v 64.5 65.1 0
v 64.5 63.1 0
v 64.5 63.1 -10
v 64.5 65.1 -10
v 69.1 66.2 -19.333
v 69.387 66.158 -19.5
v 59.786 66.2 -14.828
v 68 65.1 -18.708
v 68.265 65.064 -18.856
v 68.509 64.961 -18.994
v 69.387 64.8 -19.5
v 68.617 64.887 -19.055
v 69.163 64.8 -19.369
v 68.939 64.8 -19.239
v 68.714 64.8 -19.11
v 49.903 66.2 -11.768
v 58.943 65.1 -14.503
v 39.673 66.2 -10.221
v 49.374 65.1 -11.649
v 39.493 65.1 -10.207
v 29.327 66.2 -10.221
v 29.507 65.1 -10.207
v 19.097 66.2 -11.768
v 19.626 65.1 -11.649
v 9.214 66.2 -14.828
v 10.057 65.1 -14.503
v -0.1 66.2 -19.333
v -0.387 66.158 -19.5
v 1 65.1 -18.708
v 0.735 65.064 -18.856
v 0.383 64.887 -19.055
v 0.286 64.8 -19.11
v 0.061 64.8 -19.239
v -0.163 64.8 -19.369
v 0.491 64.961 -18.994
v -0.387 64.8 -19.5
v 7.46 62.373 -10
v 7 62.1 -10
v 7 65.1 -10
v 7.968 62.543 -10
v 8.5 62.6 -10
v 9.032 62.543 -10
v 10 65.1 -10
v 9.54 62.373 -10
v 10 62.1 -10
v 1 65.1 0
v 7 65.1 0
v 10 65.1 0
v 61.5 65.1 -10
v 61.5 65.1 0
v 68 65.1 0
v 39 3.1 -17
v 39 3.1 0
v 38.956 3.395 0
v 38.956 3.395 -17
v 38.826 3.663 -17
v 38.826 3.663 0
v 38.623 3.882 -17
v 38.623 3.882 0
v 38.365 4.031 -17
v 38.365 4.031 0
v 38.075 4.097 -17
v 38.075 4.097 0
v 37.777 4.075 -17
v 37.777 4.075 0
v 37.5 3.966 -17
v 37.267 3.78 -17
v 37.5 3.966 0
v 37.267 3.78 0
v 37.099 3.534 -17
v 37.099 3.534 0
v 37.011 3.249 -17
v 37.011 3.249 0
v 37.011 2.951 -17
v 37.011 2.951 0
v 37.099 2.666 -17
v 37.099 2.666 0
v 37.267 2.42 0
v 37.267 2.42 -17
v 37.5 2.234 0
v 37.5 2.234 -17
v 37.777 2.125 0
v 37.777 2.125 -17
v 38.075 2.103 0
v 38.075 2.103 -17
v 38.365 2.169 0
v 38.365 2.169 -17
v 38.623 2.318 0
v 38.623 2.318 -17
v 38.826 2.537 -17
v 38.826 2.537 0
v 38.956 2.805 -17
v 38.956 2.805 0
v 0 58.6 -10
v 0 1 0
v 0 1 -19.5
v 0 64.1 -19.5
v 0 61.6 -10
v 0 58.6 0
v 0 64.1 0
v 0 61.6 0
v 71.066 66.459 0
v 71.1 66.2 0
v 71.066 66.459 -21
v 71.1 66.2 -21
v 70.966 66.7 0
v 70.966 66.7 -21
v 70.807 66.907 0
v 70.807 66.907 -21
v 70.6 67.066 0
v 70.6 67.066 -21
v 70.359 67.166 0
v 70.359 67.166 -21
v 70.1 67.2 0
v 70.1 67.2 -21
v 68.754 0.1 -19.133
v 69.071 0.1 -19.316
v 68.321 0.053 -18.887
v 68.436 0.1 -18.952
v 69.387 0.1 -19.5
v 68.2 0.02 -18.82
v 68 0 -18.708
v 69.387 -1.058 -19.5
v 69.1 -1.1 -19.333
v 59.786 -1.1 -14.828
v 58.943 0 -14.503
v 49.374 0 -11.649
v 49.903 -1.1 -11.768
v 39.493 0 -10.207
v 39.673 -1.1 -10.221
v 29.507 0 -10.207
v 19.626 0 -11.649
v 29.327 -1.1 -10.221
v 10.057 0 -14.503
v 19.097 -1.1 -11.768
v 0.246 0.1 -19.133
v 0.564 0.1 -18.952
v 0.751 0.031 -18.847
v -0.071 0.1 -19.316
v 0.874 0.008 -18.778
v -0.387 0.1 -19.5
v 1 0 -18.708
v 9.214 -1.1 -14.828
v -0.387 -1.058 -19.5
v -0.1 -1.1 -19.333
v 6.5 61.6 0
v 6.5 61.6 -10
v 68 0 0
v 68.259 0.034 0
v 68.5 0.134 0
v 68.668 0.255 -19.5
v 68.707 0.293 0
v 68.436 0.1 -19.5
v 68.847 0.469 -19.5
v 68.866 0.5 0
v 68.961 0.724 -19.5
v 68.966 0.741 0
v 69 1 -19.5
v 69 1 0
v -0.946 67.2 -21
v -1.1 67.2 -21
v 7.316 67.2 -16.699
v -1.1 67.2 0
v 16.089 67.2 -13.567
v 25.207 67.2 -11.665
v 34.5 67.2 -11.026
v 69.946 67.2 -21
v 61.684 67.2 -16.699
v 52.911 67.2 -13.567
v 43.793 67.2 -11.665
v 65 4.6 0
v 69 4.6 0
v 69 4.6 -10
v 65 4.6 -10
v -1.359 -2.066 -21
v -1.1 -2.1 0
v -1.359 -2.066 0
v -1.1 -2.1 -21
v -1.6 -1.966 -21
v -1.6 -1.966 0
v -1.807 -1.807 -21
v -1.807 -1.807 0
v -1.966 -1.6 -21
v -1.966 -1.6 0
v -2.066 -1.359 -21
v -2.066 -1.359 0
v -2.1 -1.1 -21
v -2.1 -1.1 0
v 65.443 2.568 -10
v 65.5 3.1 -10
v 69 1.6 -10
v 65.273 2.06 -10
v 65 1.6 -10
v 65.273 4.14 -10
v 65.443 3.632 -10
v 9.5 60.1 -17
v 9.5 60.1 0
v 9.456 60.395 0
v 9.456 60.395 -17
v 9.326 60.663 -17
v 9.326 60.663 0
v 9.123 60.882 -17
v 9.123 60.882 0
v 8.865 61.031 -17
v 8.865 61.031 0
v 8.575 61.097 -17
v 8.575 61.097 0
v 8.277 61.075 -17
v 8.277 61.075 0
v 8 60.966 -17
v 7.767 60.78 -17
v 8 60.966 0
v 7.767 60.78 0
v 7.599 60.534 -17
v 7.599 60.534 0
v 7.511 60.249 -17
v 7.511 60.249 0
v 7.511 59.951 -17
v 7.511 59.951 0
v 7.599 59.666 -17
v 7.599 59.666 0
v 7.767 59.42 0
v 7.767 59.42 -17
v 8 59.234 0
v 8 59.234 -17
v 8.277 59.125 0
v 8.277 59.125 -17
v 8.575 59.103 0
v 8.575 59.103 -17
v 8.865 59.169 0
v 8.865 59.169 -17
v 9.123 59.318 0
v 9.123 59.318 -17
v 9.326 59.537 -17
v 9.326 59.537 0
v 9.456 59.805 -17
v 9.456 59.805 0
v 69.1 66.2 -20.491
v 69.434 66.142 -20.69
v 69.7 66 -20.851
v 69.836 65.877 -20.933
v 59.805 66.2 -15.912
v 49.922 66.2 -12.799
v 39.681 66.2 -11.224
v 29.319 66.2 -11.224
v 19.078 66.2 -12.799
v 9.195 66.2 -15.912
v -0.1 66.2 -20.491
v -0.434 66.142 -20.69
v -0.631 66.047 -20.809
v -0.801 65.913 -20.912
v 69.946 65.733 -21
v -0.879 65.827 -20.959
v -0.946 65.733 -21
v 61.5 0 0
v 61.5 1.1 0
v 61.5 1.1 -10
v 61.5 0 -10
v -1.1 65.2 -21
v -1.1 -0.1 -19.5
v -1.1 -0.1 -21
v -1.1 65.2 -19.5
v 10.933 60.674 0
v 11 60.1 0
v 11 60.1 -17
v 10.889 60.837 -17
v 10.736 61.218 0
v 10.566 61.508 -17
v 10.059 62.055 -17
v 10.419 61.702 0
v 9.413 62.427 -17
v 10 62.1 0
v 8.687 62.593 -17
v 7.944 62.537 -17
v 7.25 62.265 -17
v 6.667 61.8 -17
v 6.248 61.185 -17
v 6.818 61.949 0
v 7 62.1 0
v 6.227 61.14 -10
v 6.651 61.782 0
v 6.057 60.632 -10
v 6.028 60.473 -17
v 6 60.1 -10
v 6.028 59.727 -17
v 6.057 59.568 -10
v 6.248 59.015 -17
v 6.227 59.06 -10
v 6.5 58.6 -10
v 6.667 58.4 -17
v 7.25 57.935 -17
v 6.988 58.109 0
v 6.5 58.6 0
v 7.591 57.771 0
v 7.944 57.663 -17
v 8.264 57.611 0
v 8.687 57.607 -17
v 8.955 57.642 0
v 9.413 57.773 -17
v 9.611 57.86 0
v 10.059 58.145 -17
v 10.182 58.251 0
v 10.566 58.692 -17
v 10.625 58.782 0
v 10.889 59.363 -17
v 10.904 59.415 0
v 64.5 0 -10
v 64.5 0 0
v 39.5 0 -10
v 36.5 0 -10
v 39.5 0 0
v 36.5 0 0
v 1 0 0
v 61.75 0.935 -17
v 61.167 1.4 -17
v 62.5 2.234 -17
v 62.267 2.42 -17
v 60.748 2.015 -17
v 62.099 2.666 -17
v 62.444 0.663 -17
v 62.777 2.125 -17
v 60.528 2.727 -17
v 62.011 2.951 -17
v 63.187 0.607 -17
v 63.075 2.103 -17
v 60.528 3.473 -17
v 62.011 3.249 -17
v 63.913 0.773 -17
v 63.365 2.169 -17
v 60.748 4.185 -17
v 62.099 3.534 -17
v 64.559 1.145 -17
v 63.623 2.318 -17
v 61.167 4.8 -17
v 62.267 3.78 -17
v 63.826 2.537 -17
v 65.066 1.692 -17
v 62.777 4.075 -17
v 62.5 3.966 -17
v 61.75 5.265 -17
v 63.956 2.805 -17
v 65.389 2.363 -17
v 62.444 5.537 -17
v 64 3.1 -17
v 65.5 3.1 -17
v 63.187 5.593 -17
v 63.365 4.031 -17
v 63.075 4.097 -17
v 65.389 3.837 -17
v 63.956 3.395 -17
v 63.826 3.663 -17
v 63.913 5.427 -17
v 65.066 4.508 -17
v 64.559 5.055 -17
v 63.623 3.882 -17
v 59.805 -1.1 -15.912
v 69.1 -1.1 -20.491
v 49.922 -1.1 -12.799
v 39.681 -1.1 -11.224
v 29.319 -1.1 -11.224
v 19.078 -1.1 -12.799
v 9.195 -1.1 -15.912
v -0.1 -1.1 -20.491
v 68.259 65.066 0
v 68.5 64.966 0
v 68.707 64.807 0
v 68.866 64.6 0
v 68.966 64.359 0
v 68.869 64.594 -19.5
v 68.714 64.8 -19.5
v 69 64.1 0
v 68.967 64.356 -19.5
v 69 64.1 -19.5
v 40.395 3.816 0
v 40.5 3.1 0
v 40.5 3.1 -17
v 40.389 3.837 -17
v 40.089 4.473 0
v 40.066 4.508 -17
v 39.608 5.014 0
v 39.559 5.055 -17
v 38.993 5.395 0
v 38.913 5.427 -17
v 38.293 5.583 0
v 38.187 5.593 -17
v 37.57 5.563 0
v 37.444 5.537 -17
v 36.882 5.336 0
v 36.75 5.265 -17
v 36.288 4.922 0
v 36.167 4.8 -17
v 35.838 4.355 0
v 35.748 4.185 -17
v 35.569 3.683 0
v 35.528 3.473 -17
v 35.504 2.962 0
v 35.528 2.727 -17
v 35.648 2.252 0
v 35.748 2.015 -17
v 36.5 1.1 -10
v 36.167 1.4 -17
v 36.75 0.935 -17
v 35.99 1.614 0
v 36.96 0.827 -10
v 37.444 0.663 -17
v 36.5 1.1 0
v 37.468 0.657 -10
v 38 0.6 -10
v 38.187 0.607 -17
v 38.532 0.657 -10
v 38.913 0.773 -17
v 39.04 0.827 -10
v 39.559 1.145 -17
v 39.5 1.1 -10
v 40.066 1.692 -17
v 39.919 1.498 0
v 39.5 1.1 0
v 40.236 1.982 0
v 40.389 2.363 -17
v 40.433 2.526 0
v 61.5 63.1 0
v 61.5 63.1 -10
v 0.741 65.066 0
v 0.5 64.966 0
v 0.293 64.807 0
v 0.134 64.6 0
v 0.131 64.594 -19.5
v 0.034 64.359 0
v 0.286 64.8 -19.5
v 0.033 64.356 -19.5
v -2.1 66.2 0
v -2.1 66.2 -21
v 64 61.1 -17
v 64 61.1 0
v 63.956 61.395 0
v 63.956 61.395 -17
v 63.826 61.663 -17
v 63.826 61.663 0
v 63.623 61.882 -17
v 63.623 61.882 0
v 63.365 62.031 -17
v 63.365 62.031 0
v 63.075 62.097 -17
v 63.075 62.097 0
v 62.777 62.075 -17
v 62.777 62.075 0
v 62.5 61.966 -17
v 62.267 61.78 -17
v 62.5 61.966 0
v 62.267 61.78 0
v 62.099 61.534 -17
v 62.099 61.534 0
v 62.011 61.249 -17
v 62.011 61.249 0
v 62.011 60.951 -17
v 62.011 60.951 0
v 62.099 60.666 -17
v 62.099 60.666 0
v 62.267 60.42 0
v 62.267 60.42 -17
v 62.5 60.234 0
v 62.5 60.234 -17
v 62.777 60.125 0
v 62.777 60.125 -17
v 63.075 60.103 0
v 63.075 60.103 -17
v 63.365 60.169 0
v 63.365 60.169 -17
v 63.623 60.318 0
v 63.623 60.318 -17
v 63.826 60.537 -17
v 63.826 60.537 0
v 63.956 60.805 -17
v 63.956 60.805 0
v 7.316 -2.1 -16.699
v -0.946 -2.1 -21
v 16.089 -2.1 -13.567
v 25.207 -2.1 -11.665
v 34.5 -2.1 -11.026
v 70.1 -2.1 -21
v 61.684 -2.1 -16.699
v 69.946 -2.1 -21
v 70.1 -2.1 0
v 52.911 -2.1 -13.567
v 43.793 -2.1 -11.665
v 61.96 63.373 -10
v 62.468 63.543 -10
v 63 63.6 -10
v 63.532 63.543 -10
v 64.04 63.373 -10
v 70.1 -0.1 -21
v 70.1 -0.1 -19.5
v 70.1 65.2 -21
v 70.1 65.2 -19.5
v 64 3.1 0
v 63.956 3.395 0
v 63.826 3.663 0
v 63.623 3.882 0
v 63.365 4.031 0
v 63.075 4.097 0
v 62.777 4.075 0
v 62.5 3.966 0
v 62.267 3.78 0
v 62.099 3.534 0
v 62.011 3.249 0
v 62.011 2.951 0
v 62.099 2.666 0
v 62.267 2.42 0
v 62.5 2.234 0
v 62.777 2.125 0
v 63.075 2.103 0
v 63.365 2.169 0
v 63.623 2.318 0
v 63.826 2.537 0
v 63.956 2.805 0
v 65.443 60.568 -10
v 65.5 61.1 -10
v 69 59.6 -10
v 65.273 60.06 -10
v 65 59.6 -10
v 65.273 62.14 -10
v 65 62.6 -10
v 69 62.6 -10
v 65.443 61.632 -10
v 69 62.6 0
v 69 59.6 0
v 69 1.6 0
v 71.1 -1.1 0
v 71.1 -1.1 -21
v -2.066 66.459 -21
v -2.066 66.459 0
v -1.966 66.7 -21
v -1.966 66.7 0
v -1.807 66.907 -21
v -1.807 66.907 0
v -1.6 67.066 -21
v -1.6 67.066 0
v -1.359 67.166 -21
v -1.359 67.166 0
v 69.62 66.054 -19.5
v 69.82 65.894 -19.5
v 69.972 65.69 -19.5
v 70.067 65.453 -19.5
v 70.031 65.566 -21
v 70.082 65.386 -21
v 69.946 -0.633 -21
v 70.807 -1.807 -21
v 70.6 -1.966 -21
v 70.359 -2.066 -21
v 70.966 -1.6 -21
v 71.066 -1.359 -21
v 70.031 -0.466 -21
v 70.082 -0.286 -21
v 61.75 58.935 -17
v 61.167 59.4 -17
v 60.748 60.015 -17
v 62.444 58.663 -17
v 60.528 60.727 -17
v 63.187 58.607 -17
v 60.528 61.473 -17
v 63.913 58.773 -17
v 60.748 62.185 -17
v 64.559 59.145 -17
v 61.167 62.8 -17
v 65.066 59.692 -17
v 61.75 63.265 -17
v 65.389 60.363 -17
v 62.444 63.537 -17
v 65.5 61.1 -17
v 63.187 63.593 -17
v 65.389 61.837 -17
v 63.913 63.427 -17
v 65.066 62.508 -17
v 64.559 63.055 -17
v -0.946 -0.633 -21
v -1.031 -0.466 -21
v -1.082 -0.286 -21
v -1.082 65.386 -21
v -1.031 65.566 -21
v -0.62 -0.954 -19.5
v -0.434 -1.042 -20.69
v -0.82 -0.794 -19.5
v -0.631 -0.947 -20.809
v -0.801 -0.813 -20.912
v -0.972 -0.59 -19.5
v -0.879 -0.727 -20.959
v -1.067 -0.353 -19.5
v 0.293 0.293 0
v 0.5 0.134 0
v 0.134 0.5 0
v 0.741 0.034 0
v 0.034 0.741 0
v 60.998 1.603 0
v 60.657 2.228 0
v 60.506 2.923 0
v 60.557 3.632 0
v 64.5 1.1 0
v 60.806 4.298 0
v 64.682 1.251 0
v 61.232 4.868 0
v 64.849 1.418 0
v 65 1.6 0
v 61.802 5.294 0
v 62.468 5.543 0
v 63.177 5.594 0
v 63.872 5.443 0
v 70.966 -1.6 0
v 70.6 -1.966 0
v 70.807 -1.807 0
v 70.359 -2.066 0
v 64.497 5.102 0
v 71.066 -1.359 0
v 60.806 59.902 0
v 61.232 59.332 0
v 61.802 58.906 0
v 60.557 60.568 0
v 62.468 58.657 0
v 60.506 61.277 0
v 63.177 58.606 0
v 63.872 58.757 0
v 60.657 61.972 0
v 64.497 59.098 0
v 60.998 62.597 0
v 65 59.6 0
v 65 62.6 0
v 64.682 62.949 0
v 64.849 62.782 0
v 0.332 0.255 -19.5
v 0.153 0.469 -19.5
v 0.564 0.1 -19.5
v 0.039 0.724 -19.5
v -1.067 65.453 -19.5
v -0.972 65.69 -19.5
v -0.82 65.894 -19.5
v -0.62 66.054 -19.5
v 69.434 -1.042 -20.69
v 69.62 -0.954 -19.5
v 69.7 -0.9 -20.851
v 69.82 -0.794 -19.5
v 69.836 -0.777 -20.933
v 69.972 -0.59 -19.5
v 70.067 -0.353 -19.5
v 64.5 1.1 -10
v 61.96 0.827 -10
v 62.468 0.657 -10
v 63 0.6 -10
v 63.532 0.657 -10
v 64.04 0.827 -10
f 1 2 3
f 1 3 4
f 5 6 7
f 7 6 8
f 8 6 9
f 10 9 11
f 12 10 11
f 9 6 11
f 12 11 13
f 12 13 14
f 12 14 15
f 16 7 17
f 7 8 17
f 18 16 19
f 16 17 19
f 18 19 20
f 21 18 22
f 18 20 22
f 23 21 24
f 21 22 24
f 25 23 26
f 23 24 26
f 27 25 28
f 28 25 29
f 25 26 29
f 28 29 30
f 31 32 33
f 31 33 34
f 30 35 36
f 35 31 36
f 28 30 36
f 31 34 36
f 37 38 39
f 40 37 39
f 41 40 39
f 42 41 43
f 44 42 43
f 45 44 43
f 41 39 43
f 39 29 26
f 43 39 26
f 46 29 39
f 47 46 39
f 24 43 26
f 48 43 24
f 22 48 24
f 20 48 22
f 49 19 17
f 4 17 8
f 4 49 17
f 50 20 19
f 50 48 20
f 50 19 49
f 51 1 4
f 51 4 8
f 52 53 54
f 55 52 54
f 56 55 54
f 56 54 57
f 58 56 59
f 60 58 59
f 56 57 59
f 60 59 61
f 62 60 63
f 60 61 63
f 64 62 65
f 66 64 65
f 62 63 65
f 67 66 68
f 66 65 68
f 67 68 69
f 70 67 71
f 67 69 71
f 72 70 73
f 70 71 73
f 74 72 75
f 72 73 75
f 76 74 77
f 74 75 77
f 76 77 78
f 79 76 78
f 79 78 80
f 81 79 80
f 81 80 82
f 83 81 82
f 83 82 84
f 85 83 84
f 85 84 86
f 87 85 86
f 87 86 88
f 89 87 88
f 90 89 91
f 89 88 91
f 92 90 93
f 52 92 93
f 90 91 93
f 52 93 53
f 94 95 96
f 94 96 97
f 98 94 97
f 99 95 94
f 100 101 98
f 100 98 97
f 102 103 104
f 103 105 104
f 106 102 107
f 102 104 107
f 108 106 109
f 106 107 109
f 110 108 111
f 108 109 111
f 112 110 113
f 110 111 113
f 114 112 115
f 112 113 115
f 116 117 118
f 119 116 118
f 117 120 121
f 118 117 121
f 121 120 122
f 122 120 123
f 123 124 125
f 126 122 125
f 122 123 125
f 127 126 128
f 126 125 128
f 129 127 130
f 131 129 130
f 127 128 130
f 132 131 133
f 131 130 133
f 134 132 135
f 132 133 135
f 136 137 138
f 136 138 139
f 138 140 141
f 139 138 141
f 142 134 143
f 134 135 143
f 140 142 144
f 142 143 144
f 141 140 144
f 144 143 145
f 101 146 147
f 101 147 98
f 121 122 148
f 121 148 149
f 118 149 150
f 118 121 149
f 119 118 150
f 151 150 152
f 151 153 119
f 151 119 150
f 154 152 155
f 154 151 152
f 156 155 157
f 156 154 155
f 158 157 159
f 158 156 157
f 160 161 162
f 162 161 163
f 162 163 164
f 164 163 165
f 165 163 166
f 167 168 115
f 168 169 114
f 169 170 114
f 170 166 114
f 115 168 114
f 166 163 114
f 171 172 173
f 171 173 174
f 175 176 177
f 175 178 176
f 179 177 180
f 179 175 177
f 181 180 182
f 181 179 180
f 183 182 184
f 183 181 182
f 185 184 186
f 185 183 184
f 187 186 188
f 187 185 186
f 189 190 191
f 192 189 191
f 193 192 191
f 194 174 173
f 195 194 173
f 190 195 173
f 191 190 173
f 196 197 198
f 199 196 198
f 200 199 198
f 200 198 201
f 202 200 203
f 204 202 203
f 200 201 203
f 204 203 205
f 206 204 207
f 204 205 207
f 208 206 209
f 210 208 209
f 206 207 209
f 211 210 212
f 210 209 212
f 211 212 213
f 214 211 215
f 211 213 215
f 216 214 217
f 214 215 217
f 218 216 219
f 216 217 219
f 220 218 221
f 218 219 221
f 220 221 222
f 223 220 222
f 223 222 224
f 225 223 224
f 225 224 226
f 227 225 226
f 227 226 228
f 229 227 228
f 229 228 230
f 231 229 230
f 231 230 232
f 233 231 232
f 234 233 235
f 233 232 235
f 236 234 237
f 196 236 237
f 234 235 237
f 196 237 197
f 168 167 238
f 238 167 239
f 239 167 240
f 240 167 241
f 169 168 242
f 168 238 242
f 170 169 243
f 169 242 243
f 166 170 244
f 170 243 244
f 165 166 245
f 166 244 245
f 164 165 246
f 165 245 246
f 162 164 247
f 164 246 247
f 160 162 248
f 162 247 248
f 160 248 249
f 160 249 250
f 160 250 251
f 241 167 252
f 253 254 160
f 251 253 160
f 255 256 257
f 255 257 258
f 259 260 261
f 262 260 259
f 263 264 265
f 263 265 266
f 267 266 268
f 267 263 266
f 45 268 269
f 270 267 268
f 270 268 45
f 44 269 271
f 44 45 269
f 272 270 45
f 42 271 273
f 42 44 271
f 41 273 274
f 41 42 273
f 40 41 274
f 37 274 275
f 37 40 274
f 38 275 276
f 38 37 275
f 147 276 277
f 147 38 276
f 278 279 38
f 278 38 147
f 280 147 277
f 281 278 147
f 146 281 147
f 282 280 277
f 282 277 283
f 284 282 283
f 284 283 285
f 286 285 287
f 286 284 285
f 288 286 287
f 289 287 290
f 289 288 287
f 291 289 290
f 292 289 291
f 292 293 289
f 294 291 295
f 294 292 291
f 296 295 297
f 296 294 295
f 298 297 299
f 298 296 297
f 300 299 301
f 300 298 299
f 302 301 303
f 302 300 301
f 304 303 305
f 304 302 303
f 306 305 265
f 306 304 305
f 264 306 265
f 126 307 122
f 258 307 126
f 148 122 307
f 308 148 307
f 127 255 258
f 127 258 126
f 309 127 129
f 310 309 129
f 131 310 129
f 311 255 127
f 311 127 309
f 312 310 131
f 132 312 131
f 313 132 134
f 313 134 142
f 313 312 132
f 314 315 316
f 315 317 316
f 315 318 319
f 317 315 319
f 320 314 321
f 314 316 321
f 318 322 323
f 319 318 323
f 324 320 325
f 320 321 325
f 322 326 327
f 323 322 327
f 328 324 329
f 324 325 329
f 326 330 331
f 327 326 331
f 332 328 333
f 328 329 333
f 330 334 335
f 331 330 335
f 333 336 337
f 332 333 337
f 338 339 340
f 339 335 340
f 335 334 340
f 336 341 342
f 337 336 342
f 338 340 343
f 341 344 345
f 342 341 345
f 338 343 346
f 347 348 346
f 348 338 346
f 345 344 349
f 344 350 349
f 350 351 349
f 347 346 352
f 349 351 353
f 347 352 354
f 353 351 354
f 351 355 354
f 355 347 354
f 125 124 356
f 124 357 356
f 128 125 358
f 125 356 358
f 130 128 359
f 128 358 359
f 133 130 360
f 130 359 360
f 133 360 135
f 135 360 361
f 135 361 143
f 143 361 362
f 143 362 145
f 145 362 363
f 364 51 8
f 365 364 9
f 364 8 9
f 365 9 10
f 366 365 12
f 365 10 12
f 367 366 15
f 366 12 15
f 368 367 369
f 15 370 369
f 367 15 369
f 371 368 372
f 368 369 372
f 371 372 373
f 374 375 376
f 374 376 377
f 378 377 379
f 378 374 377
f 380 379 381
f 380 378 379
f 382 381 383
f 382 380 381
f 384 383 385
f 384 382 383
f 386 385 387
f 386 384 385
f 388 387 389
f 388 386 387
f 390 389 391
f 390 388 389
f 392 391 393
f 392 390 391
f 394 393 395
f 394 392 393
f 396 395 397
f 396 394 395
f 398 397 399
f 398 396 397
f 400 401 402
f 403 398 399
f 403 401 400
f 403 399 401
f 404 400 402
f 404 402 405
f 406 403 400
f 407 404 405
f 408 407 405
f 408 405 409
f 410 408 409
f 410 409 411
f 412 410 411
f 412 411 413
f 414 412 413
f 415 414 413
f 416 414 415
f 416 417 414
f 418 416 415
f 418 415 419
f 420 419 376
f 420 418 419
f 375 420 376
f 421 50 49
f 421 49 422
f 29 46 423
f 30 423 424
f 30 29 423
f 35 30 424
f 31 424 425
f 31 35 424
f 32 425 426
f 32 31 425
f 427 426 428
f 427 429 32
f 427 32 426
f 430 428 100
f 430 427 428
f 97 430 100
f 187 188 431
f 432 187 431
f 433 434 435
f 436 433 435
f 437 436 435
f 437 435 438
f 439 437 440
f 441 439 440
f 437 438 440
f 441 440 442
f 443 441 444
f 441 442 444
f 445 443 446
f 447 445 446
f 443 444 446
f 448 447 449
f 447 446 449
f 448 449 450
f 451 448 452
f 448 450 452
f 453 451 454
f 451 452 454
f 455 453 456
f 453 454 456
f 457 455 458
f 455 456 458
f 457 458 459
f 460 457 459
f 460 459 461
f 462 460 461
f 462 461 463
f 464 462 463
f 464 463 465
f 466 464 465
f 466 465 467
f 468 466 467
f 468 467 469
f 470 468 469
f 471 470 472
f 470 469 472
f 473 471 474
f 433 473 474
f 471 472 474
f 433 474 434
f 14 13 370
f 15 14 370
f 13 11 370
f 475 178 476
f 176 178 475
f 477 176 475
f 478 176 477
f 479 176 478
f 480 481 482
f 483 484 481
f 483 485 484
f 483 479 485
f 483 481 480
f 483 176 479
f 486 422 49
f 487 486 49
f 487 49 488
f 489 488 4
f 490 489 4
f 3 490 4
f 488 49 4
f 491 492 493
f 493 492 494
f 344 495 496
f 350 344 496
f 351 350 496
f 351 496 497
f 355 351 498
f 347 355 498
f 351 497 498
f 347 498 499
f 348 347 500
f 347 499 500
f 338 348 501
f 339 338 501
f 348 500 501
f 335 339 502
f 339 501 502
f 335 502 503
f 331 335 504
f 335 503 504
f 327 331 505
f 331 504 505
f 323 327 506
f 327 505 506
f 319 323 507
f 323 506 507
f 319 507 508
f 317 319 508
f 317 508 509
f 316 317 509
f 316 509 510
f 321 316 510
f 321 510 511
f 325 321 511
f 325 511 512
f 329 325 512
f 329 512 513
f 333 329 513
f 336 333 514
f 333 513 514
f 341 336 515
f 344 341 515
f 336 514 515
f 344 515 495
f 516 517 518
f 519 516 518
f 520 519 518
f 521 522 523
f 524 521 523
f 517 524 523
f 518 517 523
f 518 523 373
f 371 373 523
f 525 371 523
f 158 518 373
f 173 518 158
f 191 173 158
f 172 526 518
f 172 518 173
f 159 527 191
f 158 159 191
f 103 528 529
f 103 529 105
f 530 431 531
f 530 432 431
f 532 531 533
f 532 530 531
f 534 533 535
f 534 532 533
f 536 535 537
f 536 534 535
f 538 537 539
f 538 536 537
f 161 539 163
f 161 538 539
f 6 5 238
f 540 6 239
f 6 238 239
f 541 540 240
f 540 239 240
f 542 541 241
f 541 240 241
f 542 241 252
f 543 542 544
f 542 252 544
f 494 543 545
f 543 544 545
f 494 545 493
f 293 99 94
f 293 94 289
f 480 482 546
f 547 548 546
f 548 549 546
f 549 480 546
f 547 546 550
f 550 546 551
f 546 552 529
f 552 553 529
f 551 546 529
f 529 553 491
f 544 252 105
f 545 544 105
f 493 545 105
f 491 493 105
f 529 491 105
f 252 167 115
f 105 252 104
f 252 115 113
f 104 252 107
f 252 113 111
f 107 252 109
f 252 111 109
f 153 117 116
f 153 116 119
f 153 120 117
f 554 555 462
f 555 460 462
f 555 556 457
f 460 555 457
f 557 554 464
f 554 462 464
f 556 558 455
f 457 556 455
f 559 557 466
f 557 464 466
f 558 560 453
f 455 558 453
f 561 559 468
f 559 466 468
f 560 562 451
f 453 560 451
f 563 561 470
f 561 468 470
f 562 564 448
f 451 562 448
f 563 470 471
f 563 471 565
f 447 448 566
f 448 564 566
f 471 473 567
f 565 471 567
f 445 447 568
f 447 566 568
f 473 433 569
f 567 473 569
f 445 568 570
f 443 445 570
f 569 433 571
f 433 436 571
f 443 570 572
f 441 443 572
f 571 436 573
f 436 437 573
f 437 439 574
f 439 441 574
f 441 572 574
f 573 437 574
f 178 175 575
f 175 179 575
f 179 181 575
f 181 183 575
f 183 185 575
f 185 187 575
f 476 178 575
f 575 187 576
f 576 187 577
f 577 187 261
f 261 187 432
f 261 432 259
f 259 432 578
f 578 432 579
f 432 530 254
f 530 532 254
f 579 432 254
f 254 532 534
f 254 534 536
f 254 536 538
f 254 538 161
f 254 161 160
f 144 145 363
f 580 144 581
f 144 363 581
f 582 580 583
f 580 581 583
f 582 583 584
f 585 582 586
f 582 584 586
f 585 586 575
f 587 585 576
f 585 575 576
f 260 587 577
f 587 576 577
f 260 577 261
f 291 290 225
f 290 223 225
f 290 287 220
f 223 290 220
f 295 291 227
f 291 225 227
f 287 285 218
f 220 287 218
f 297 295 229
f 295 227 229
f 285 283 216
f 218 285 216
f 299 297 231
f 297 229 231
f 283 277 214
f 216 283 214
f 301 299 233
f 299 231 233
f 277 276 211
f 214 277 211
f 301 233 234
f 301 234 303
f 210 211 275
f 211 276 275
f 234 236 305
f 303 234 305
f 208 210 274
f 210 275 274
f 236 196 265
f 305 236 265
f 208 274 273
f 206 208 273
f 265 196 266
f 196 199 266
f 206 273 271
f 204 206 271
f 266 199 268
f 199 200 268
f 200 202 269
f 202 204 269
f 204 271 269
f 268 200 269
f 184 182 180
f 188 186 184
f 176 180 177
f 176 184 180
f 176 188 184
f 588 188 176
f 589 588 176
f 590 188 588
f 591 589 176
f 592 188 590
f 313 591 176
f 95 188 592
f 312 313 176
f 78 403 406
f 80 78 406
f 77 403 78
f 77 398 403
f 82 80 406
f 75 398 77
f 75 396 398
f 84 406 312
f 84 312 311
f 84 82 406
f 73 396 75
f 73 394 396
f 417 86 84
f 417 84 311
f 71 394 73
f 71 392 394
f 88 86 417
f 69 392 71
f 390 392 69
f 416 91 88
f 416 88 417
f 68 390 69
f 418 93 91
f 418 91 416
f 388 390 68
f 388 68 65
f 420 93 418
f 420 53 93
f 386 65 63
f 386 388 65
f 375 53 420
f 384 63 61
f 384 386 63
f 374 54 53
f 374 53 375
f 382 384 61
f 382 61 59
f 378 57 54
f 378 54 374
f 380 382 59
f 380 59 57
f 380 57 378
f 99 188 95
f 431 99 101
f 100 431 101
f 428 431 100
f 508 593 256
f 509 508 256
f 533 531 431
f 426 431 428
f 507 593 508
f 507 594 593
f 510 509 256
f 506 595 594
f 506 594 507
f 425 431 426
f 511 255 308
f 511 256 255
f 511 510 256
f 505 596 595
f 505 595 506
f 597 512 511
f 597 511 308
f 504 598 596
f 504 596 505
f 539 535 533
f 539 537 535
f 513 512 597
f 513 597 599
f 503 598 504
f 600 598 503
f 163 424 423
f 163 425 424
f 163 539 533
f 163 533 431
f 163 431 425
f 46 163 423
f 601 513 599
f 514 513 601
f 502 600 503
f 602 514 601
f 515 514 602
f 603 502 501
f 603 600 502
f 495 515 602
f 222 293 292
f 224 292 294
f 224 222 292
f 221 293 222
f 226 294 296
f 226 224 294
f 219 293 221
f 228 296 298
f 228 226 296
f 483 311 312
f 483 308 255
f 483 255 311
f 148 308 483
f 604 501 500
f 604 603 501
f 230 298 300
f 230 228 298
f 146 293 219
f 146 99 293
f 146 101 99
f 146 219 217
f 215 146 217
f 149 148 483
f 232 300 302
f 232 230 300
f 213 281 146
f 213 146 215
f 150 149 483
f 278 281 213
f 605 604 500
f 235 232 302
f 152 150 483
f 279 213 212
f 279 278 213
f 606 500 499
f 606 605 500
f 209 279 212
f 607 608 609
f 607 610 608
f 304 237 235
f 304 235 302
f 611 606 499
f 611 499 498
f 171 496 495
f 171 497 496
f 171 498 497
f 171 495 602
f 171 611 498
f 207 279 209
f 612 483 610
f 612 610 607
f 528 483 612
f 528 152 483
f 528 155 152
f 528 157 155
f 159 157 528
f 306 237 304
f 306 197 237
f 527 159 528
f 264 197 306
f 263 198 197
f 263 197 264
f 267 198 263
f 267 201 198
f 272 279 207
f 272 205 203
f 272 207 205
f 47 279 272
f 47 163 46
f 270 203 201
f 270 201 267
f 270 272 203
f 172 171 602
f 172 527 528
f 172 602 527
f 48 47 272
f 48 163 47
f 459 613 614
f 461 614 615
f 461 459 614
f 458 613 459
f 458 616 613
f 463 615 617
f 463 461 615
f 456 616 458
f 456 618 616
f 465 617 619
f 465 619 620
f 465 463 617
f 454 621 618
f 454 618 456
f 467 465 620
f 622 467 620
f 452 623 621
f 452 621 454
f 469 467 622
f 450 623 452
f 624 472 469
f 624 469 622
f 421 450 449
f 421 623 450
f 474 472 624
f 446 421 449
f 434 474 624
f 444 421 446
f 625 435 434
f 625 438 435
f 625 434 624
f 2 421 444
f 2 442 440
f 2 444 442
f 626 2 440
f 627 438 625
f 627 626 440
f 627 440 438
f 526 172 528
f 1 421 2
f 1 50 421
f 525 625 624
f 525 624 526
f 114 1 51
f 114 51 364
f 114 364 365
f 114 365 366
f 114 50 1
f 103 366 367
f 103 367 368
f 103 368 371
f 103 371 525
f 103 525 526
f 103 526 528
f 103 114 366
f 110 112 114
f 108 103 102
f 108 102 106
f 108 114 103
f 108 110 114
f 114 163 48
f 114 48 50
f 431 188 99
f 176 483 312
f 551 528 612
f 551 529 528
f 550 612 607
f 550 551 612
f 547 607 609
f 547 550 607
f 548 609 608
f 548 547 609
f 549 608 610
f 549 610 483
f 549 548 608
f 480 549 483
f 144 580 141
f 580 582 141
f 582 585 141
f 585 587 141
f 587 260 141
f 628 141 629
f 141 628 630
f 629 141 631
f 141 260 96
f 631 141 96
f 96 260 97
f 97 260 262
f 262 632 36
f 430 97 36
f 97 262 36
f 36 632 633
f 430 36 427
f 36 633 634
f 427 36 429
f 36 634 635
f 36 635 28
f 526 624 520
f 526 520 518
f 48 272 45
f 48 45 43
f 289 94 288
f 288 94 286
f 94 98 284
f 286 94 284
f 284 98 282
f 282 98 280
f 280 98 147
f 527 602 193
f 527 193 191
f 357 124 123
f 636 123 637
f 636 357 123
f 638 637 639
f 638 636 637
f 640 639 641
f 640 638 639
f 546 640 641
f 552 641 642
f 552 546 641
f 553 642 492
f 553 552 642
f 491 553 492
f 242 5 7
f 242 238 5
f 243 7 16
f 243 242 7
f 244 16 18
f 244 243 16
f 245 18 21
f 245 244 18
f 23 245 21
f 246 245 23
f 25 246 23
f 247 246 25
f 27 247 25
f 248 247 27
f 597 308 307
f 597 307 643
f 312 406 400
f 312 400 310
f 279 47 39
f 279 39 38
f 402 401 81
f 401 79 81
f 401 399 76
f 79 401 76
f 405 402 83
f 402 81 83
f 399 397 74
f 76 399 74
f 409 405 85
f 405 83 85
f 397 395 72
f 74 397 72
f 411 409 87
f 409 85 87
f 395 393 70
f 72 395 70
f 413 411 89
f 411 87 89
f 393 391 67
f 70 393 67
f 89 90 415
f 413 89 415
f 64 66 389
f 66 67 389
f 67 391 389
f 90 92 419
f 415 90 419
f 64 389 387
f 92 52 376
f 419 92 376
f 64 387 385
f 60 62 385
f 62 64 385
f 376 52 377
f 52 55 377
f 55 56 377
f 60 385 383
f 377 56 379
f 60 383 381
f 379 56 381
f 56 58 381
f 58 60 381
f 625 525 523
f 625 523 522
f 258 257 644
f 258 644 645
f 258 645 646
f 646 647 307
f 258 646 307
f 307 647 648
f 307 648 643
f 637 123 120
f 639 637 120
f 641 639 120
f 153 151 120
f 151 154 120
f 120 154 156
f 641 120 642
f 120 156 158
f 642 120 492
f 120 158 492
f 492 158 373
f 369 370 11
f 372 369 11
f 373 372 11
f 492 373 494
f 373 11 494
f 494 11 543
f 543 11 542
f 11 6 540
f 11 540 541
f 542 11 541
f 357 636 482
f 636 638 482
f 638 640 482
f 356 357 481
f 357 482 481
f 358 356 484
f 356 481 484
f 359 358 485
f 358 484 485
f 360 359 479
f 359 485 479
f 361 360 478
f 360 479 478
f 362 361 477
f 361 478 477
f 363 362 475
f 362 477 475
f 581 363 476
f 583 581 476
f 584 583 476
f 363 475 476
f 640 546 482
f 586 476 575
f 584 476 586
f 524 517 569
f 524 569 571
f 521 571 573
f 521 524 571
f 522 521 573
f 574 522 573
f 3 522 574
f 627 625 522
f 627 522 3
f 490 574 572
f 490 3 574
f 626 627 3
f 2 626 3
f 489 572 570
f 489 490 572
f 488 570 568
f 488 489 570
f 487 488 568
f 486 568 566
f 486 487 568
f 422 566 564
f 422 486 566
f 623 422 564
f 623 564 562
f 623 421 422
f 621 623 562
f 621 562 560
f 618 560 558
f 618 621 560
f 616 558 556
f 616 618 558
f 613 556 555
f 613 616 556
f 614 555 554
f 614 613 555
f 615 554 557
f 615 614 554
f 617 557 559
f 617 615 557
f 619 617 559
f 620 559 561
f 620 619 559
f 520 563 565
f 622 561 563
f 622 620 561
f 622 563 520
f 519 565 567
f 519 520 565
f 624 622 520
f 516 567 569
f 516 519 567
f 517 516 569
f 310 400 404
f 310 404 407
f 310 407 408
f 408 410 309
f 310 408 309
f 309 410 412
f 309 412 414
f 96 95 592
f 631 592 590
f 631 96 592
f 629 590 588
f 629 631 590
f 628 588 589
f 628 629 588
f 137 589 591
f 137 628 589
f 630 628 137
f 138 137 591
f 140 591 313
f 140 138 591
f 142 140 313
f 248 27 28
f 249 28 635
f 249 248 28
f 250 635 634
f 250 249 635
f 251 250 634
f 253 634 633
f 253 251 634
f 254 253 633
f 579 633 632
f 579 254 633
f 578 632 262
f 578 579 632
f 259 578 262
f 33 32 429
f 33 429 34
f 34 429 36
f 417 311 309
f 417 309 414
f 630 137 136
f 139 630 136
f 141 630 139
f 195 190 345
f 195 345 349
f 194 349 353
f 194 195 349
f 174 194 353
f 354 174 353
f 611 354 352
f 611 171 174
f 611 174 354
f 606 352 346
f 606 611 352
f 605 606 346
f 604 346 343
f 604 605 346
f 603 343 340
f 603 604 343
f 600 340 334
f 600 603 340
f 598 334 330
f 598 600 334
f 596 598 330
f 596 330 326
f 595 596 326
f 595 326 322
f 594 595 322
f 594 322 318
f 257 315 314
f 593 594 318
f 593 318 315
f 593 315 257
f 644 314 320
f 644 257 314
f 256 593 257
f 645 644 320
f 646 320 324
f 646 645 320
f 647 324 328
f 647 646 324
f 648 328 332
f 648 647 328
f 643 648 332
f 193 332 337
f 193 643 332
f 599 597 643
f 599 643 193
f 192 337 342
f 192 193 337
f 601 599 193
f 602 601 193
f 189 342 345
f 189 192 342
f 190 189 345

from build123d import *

# Parameters (mm, degrees)
SKIZZE1_R                         = 2.5
SKIZZE1_R_2                       = 1
AUFSATZ_LINEAR_AUSTRAGEN1_DEPTH   = 17
AUFSATZ_LINEAR_AUSTRAGEN1_2_DEPTH = 17
AUFSATZ_LINEAR_AUSTRAGEN1_3_DEPTH = 17
AUFSATZ_LINEAR_AUSTRAGEN1_4_DEPTH = 17
SKIZZE1_3_W                       = 73.2
SKIZZE1_3_H                       = 69.3
SKIZZE1_3_W_2                     = 71.2
SKIZZE1_3_H_2                     = 67.3
AUFSATZ_LINEAR_AUSTRAGEN2_DEPTH   = 21
SKIZZE1_4_W                       = 71.2
SKIZZE1_4_H                       = 67.3
AUFSATZ_LINEAR_AUSTRAGEN3_DEPTH   = 19.5
SCHNITT_LINEAR_AUSTRAGEN1_DEPTH   = 2.1
SCHNITT_LINEAR_START              = -1
SCHNITT_LINEAR_AUSTRAGEN4_DEPTH   = 1.2
SCHNITT_LINEAR_START_2            = -66.9
SCHNITT_LINEAR_AUSTRAGEN6_DEPTH   = 1.4
AUFSATZ_LINEAR_AUSTRAGEN4_DEPTH   = 10
SCHNITT_LINEAR_AUSTRAGEN7_DEPTH   = 10
VERRUNDUNG1_R                     = 1
VERRUNDUNG2_R                     = 1


with BuildPart() as part:
    # Skizze1 → Aufsatz-Linear austragen1 (new body)
    with BuildSketch(Plane.XY):
        with Locations((38, 3.1)):
            Circle(SKIZZE1_R)
        with Locations((38, 3.1)):
            Circle(SKIZZE1_R_2, mode=Mode.SUBTRACT)
    extrude(amount=-AUFSATZ_LINEAR_AUSTRAGEN1_DEPTH)



with BuildPart() as body_2:
    # Skizze1 → Aufsatz-Linear austragen1 2 (new body)
    with BuildSketch(Plane.XY):
        with Locations((8.5, 60.1)):
            Circle(SKIZZE1_R)
        with Locations((8.5, 60.1)):
            Circle(SKIZZE1_R_2, mode=Mode.SUBTRACT)
    extrude(amount=-AUFSATZ_LINEAR_AUSTRAGEN1_2_DEPTH)


with BuildPart() as body_3:
    # Skizze1 → Aufsatz-Linear austragen1 3 (new body)
    with BuildSketch(Plane.XY):
        with Locations((63, 3.1)):
            Circle(SKIZZE1_R)
        with Locations((63, 3.1)):
            Circle(SKIZZE1_R_2, mode=Mode.SUBTRACT)
    extrude(amount=-AUFSATZ_LINEAR_AUSTRAGEN1_3_DEPTH)


with BuildPart() as body_4:
    # Skizze1 → Aufsatz-Linear austragen1 4 (new body)
    with BuildSketch(Plane.XY):
        with Locations((63, 61.1)):
            Circle(SKIZZE1_R)
        with Locations((63, 61.1)):
            Circle(SKIZZE1_R_2, mode=Mode.SUBTRACT)
    extrude(amount=-AUFSATZ_LINEAR_AUSTRAGEN1_4_DEPTH)


with BuildPart() as body_5:
    # Skizze1<3> → Aufsatz-Linear austragen2 (new body)
    with BuildSketch(Plane.XY):
        with Locations((34.5, 32.55)):
            Rectangle(SKIZZE1_3_W, SKIZZE1_3_H)
        with Locations((34.5, 32.55)):
            Rectangle(SKIZZE1_3_W_2, SKIZZE1_3_H_2, mode=Mode.SUBTRACT)
    extrude(amount=-AUFSATZ_LINEAR_AUSTRAGEN2_DEPTH)

    # Skizze1<4> → Aufsatz-Linear austragen3 (add)
    with BuildSketch(Plane.XY):
        with Locations((34.5, 32.55)):
            Rectangle(SKIZZE1_4_W, SKIZZE1_4_H)
        Polygon((36.5, 0), (0, 0), (0, 58.6), (0, 60.1), (0, 61.6), (0, 65.1), (7, 65.1), (8.5, 65.1), (10, 65.1), (61.5, 65.1), (63, 65.1), (64.5, 65.1), (69, 65.1), (69, 62.6), (69, 61.1), (69, 59.6), (69, 4.6), (69, 3.1), (69, 1.6), (69, 0), (64.5, 0), (63, 0), (61.5, 0), (39.5, 0), (38, 0), align=None, mode=Mode.SUBTRACT)
    extrude(amount=-AUFSATZ_LINEAR_AUSTRAGEN3_DEPTH)

    # Skizze2 → Schnitt-Linear austragen1 (cut)
    with BuildSketch(Plane(origin=(0, -2.1, 0), x_dir=(-1, 0, 0), z_dir=(0, -1, 0))):
        with BuildLine():
            ThreePointArc((-69.94600721, 21), (-34.5, 11.026332841), (0.94600721, 21))
            Line((0.94600721, 21), (-69.94600721, 21))
        make_face()
    extrude(amount=-SCHNITT_LINEAR_AUSTRAGEN1_DEPTH, mode=Mode.SUBTRACT)

    # Skizze2<6> → Schnitt-Linear austragen4 (cut)
    with BuildSketch(Plane(origin=(0, -2.1, 0), x_dir=(-1, 0, 0), z_dir=(0, -1, 0)).offset(SCHNITT_LINEAR_START)):
        with BuildLine():
            Line((0.94600721, 19.831196274), (0.94600721, 21))
            ThreePointArc((0.94600721, 21), (-34.5, 11.026332841), (-69.94600721, 21))
            Line((-69.94600721, 21), (-69.94600721, 19.831196274))
            ThreePointArc((-69.94600721, 19.831196274), (-34.5, 10.026332841), (0.94600721, 19.831196274))
        make_face()
    extrude(amount=-SCHNITT_LINEAR_AUSTRAGEN4_DEPTH, mode=Mode.SUBTRACT)

    # Skizze2<14> → Schnitt-Linear austragen6 (cut)
    with BuildSketch(Plane(origin=(0, -2.1, 0), x_dir=(-1, 0, 0), z_dir=(0, -1, 0)).offset(SCHNITT_LINEAR_START_2)):
        with BuildLine():
            Line((0.94600721, 19.831196274), (0.94600721, 21))
            ThreePointArc((0.94600721, 21), (-34.5, 11.026332841), (-69.94600721, 21))
            Line((-69.94600721, 21), (-69.94600721, 19.831196274))
            ThreePointArc((-69.94600721, 19.831196274), (-34.5, 10.026332841), (0.94600721, 19.831196274))
        make_face()
    extrude(amount=-SCHNITT_LINEAR_AUSTRAGEN6_DEPTH, mode=Mode.SUBTRACT)


with BuildPart() as part_1:
    add(part.part)

    add(body_2.part)  # Aufsatz-Linear austragen4 merges body 2

    add(body_3.part)  # Aufsatz-Linear austragen4 merges body 3

    add(body_4.part)  # Aufsatz-Linear austragen4 merges body 4

    add(body_5.part)  # Aufsatz-Linear austragen4 merges body 5
    # Skizze1<5> → Aufsatz-Linear austragen4 (add)
    with BuildSketch(Plane.XY):
        with BuildLine():
            Line((36.5, 1.1), (36.5, 0))
            Line((36.5, 0), (39.5, 0))
            Line((39.5, 0), (39.5, 1.1))
            ThreePointArc((39.5, 1.1), (38, 0.6), (36.5, 1.1))
        make_face()
        with BuildLine():
            Line((0, 58.6), (6.5, 58.6))
            ThreePointArc((6.5, 58.6), (6, 60.1), (6.5, 61.6))
            Line((6.5, 61.6), (0, 61.6))
            Line((0, 61.6), (0, 58.6))
        make_face()
        with BuildLine():
            Line((61.5, 1.1), (61.5, 0))
            Line((61.5, 0), (64.5, 0))
            Line((64.5, 0), (64.5, 1.1))
            ThreePointArc((64.5, 1.1), (63, 0.6), (61.5, 1.1))
        make_face()
        with BuildLine():
            Line((10, 62.1), (10, 65.1))
            Line((10, 65.1), (7, 65.1))
            Line((7, 65.1), (7, 62.1))
            ThreePointArc((7, 62.1), (8.5, 62.6), (10, 62.1))
        make_face()
        with BuildLine():
            Line((69, 4.6), (65, 4.6))
            ThreePointArc((65, 4.6), (65.5, 3.1), (65, 1.6))
            Line((65, 1.6), (69, 1.6))
            Line((69, 1.6), (69, 4.6))
        make_face()
        with BuildLine():
            Line((61.5, 65.1), (61.5, 63.1))
            ThreePointArc((61.5, 63.1), (63, 63.6), (64.5, 63.1))
            Line((64.5, 63.1), (64.5, 65.1))
            Line((64.5, 65.1), (61.5, 65.1))
        make_face()
        with BuildLine():
            Line((65, 59.6), (69, 59.6))
            Line((69, 59.6), (69, 62.6))
            Line((69, 62.6), (65, 62.6))
            ThreePointArc((65, 62.6), (65.5, 61.1), (65, 59.6))
        make_face()
    extrude(amount=-AUFSATZ_LINEAR_AUSTRAGEN4_DEPTH)

    # Skizze2<15> → Schnitt-Linear austragen7 (cut)
    with BuildSketch(Plane(origin=(0, -2.1, 0), x_dir=(-1, 0, 0), z_dir=(0, -1, 0)).offset(SCHNITT_LINEAR_START_2)):
        with BuildLine():
            ThreePointArc((-69.94600721, 21), (-34.5, 11.026332841), (0.94600721, 21))
            Line((0.94600721, 21), (-69.94600721, 21))
        make_face()
    extrude(amount=-SCHNITT_LINEAR_AUSTRAGEN7_DEPTH, mode=Mode.SUBTRACT)

    # Verrundung1
    verrundung1_edges = [part_1.edges().sort_by_distance(p)[0] for p in [
        (0, 65.1, -9.63732781),
        (69, 65.1, -9.63732781),
        (69, 0, -9.63732781),
        (0, 0, -9.63732781),
        (-2.1, -2.1, -10.5),
        (71.1, -2.1, -10.5),
        (71.1, 67.2, -10.5),
        (-2.1, 67.2, -10.5),
    ]]
    fillet(verrundung1_edges, radius=VERRUNDUNG1_R)

    # Verrundung2
    verrundung2_edges = [part_1.edges().sort_by_distance(p)[0] for p in [
        (70.1, 66.2, -20.25),
        (70.1, -1.1, -20.25),
        (-1.1, -1.1, -20.25),
        (-1.1, 66.2, -20.25),
    ]]
    fillet(verrundung2_edges, radius=VERRUNDUNG2_R)


solid = part_1.part
